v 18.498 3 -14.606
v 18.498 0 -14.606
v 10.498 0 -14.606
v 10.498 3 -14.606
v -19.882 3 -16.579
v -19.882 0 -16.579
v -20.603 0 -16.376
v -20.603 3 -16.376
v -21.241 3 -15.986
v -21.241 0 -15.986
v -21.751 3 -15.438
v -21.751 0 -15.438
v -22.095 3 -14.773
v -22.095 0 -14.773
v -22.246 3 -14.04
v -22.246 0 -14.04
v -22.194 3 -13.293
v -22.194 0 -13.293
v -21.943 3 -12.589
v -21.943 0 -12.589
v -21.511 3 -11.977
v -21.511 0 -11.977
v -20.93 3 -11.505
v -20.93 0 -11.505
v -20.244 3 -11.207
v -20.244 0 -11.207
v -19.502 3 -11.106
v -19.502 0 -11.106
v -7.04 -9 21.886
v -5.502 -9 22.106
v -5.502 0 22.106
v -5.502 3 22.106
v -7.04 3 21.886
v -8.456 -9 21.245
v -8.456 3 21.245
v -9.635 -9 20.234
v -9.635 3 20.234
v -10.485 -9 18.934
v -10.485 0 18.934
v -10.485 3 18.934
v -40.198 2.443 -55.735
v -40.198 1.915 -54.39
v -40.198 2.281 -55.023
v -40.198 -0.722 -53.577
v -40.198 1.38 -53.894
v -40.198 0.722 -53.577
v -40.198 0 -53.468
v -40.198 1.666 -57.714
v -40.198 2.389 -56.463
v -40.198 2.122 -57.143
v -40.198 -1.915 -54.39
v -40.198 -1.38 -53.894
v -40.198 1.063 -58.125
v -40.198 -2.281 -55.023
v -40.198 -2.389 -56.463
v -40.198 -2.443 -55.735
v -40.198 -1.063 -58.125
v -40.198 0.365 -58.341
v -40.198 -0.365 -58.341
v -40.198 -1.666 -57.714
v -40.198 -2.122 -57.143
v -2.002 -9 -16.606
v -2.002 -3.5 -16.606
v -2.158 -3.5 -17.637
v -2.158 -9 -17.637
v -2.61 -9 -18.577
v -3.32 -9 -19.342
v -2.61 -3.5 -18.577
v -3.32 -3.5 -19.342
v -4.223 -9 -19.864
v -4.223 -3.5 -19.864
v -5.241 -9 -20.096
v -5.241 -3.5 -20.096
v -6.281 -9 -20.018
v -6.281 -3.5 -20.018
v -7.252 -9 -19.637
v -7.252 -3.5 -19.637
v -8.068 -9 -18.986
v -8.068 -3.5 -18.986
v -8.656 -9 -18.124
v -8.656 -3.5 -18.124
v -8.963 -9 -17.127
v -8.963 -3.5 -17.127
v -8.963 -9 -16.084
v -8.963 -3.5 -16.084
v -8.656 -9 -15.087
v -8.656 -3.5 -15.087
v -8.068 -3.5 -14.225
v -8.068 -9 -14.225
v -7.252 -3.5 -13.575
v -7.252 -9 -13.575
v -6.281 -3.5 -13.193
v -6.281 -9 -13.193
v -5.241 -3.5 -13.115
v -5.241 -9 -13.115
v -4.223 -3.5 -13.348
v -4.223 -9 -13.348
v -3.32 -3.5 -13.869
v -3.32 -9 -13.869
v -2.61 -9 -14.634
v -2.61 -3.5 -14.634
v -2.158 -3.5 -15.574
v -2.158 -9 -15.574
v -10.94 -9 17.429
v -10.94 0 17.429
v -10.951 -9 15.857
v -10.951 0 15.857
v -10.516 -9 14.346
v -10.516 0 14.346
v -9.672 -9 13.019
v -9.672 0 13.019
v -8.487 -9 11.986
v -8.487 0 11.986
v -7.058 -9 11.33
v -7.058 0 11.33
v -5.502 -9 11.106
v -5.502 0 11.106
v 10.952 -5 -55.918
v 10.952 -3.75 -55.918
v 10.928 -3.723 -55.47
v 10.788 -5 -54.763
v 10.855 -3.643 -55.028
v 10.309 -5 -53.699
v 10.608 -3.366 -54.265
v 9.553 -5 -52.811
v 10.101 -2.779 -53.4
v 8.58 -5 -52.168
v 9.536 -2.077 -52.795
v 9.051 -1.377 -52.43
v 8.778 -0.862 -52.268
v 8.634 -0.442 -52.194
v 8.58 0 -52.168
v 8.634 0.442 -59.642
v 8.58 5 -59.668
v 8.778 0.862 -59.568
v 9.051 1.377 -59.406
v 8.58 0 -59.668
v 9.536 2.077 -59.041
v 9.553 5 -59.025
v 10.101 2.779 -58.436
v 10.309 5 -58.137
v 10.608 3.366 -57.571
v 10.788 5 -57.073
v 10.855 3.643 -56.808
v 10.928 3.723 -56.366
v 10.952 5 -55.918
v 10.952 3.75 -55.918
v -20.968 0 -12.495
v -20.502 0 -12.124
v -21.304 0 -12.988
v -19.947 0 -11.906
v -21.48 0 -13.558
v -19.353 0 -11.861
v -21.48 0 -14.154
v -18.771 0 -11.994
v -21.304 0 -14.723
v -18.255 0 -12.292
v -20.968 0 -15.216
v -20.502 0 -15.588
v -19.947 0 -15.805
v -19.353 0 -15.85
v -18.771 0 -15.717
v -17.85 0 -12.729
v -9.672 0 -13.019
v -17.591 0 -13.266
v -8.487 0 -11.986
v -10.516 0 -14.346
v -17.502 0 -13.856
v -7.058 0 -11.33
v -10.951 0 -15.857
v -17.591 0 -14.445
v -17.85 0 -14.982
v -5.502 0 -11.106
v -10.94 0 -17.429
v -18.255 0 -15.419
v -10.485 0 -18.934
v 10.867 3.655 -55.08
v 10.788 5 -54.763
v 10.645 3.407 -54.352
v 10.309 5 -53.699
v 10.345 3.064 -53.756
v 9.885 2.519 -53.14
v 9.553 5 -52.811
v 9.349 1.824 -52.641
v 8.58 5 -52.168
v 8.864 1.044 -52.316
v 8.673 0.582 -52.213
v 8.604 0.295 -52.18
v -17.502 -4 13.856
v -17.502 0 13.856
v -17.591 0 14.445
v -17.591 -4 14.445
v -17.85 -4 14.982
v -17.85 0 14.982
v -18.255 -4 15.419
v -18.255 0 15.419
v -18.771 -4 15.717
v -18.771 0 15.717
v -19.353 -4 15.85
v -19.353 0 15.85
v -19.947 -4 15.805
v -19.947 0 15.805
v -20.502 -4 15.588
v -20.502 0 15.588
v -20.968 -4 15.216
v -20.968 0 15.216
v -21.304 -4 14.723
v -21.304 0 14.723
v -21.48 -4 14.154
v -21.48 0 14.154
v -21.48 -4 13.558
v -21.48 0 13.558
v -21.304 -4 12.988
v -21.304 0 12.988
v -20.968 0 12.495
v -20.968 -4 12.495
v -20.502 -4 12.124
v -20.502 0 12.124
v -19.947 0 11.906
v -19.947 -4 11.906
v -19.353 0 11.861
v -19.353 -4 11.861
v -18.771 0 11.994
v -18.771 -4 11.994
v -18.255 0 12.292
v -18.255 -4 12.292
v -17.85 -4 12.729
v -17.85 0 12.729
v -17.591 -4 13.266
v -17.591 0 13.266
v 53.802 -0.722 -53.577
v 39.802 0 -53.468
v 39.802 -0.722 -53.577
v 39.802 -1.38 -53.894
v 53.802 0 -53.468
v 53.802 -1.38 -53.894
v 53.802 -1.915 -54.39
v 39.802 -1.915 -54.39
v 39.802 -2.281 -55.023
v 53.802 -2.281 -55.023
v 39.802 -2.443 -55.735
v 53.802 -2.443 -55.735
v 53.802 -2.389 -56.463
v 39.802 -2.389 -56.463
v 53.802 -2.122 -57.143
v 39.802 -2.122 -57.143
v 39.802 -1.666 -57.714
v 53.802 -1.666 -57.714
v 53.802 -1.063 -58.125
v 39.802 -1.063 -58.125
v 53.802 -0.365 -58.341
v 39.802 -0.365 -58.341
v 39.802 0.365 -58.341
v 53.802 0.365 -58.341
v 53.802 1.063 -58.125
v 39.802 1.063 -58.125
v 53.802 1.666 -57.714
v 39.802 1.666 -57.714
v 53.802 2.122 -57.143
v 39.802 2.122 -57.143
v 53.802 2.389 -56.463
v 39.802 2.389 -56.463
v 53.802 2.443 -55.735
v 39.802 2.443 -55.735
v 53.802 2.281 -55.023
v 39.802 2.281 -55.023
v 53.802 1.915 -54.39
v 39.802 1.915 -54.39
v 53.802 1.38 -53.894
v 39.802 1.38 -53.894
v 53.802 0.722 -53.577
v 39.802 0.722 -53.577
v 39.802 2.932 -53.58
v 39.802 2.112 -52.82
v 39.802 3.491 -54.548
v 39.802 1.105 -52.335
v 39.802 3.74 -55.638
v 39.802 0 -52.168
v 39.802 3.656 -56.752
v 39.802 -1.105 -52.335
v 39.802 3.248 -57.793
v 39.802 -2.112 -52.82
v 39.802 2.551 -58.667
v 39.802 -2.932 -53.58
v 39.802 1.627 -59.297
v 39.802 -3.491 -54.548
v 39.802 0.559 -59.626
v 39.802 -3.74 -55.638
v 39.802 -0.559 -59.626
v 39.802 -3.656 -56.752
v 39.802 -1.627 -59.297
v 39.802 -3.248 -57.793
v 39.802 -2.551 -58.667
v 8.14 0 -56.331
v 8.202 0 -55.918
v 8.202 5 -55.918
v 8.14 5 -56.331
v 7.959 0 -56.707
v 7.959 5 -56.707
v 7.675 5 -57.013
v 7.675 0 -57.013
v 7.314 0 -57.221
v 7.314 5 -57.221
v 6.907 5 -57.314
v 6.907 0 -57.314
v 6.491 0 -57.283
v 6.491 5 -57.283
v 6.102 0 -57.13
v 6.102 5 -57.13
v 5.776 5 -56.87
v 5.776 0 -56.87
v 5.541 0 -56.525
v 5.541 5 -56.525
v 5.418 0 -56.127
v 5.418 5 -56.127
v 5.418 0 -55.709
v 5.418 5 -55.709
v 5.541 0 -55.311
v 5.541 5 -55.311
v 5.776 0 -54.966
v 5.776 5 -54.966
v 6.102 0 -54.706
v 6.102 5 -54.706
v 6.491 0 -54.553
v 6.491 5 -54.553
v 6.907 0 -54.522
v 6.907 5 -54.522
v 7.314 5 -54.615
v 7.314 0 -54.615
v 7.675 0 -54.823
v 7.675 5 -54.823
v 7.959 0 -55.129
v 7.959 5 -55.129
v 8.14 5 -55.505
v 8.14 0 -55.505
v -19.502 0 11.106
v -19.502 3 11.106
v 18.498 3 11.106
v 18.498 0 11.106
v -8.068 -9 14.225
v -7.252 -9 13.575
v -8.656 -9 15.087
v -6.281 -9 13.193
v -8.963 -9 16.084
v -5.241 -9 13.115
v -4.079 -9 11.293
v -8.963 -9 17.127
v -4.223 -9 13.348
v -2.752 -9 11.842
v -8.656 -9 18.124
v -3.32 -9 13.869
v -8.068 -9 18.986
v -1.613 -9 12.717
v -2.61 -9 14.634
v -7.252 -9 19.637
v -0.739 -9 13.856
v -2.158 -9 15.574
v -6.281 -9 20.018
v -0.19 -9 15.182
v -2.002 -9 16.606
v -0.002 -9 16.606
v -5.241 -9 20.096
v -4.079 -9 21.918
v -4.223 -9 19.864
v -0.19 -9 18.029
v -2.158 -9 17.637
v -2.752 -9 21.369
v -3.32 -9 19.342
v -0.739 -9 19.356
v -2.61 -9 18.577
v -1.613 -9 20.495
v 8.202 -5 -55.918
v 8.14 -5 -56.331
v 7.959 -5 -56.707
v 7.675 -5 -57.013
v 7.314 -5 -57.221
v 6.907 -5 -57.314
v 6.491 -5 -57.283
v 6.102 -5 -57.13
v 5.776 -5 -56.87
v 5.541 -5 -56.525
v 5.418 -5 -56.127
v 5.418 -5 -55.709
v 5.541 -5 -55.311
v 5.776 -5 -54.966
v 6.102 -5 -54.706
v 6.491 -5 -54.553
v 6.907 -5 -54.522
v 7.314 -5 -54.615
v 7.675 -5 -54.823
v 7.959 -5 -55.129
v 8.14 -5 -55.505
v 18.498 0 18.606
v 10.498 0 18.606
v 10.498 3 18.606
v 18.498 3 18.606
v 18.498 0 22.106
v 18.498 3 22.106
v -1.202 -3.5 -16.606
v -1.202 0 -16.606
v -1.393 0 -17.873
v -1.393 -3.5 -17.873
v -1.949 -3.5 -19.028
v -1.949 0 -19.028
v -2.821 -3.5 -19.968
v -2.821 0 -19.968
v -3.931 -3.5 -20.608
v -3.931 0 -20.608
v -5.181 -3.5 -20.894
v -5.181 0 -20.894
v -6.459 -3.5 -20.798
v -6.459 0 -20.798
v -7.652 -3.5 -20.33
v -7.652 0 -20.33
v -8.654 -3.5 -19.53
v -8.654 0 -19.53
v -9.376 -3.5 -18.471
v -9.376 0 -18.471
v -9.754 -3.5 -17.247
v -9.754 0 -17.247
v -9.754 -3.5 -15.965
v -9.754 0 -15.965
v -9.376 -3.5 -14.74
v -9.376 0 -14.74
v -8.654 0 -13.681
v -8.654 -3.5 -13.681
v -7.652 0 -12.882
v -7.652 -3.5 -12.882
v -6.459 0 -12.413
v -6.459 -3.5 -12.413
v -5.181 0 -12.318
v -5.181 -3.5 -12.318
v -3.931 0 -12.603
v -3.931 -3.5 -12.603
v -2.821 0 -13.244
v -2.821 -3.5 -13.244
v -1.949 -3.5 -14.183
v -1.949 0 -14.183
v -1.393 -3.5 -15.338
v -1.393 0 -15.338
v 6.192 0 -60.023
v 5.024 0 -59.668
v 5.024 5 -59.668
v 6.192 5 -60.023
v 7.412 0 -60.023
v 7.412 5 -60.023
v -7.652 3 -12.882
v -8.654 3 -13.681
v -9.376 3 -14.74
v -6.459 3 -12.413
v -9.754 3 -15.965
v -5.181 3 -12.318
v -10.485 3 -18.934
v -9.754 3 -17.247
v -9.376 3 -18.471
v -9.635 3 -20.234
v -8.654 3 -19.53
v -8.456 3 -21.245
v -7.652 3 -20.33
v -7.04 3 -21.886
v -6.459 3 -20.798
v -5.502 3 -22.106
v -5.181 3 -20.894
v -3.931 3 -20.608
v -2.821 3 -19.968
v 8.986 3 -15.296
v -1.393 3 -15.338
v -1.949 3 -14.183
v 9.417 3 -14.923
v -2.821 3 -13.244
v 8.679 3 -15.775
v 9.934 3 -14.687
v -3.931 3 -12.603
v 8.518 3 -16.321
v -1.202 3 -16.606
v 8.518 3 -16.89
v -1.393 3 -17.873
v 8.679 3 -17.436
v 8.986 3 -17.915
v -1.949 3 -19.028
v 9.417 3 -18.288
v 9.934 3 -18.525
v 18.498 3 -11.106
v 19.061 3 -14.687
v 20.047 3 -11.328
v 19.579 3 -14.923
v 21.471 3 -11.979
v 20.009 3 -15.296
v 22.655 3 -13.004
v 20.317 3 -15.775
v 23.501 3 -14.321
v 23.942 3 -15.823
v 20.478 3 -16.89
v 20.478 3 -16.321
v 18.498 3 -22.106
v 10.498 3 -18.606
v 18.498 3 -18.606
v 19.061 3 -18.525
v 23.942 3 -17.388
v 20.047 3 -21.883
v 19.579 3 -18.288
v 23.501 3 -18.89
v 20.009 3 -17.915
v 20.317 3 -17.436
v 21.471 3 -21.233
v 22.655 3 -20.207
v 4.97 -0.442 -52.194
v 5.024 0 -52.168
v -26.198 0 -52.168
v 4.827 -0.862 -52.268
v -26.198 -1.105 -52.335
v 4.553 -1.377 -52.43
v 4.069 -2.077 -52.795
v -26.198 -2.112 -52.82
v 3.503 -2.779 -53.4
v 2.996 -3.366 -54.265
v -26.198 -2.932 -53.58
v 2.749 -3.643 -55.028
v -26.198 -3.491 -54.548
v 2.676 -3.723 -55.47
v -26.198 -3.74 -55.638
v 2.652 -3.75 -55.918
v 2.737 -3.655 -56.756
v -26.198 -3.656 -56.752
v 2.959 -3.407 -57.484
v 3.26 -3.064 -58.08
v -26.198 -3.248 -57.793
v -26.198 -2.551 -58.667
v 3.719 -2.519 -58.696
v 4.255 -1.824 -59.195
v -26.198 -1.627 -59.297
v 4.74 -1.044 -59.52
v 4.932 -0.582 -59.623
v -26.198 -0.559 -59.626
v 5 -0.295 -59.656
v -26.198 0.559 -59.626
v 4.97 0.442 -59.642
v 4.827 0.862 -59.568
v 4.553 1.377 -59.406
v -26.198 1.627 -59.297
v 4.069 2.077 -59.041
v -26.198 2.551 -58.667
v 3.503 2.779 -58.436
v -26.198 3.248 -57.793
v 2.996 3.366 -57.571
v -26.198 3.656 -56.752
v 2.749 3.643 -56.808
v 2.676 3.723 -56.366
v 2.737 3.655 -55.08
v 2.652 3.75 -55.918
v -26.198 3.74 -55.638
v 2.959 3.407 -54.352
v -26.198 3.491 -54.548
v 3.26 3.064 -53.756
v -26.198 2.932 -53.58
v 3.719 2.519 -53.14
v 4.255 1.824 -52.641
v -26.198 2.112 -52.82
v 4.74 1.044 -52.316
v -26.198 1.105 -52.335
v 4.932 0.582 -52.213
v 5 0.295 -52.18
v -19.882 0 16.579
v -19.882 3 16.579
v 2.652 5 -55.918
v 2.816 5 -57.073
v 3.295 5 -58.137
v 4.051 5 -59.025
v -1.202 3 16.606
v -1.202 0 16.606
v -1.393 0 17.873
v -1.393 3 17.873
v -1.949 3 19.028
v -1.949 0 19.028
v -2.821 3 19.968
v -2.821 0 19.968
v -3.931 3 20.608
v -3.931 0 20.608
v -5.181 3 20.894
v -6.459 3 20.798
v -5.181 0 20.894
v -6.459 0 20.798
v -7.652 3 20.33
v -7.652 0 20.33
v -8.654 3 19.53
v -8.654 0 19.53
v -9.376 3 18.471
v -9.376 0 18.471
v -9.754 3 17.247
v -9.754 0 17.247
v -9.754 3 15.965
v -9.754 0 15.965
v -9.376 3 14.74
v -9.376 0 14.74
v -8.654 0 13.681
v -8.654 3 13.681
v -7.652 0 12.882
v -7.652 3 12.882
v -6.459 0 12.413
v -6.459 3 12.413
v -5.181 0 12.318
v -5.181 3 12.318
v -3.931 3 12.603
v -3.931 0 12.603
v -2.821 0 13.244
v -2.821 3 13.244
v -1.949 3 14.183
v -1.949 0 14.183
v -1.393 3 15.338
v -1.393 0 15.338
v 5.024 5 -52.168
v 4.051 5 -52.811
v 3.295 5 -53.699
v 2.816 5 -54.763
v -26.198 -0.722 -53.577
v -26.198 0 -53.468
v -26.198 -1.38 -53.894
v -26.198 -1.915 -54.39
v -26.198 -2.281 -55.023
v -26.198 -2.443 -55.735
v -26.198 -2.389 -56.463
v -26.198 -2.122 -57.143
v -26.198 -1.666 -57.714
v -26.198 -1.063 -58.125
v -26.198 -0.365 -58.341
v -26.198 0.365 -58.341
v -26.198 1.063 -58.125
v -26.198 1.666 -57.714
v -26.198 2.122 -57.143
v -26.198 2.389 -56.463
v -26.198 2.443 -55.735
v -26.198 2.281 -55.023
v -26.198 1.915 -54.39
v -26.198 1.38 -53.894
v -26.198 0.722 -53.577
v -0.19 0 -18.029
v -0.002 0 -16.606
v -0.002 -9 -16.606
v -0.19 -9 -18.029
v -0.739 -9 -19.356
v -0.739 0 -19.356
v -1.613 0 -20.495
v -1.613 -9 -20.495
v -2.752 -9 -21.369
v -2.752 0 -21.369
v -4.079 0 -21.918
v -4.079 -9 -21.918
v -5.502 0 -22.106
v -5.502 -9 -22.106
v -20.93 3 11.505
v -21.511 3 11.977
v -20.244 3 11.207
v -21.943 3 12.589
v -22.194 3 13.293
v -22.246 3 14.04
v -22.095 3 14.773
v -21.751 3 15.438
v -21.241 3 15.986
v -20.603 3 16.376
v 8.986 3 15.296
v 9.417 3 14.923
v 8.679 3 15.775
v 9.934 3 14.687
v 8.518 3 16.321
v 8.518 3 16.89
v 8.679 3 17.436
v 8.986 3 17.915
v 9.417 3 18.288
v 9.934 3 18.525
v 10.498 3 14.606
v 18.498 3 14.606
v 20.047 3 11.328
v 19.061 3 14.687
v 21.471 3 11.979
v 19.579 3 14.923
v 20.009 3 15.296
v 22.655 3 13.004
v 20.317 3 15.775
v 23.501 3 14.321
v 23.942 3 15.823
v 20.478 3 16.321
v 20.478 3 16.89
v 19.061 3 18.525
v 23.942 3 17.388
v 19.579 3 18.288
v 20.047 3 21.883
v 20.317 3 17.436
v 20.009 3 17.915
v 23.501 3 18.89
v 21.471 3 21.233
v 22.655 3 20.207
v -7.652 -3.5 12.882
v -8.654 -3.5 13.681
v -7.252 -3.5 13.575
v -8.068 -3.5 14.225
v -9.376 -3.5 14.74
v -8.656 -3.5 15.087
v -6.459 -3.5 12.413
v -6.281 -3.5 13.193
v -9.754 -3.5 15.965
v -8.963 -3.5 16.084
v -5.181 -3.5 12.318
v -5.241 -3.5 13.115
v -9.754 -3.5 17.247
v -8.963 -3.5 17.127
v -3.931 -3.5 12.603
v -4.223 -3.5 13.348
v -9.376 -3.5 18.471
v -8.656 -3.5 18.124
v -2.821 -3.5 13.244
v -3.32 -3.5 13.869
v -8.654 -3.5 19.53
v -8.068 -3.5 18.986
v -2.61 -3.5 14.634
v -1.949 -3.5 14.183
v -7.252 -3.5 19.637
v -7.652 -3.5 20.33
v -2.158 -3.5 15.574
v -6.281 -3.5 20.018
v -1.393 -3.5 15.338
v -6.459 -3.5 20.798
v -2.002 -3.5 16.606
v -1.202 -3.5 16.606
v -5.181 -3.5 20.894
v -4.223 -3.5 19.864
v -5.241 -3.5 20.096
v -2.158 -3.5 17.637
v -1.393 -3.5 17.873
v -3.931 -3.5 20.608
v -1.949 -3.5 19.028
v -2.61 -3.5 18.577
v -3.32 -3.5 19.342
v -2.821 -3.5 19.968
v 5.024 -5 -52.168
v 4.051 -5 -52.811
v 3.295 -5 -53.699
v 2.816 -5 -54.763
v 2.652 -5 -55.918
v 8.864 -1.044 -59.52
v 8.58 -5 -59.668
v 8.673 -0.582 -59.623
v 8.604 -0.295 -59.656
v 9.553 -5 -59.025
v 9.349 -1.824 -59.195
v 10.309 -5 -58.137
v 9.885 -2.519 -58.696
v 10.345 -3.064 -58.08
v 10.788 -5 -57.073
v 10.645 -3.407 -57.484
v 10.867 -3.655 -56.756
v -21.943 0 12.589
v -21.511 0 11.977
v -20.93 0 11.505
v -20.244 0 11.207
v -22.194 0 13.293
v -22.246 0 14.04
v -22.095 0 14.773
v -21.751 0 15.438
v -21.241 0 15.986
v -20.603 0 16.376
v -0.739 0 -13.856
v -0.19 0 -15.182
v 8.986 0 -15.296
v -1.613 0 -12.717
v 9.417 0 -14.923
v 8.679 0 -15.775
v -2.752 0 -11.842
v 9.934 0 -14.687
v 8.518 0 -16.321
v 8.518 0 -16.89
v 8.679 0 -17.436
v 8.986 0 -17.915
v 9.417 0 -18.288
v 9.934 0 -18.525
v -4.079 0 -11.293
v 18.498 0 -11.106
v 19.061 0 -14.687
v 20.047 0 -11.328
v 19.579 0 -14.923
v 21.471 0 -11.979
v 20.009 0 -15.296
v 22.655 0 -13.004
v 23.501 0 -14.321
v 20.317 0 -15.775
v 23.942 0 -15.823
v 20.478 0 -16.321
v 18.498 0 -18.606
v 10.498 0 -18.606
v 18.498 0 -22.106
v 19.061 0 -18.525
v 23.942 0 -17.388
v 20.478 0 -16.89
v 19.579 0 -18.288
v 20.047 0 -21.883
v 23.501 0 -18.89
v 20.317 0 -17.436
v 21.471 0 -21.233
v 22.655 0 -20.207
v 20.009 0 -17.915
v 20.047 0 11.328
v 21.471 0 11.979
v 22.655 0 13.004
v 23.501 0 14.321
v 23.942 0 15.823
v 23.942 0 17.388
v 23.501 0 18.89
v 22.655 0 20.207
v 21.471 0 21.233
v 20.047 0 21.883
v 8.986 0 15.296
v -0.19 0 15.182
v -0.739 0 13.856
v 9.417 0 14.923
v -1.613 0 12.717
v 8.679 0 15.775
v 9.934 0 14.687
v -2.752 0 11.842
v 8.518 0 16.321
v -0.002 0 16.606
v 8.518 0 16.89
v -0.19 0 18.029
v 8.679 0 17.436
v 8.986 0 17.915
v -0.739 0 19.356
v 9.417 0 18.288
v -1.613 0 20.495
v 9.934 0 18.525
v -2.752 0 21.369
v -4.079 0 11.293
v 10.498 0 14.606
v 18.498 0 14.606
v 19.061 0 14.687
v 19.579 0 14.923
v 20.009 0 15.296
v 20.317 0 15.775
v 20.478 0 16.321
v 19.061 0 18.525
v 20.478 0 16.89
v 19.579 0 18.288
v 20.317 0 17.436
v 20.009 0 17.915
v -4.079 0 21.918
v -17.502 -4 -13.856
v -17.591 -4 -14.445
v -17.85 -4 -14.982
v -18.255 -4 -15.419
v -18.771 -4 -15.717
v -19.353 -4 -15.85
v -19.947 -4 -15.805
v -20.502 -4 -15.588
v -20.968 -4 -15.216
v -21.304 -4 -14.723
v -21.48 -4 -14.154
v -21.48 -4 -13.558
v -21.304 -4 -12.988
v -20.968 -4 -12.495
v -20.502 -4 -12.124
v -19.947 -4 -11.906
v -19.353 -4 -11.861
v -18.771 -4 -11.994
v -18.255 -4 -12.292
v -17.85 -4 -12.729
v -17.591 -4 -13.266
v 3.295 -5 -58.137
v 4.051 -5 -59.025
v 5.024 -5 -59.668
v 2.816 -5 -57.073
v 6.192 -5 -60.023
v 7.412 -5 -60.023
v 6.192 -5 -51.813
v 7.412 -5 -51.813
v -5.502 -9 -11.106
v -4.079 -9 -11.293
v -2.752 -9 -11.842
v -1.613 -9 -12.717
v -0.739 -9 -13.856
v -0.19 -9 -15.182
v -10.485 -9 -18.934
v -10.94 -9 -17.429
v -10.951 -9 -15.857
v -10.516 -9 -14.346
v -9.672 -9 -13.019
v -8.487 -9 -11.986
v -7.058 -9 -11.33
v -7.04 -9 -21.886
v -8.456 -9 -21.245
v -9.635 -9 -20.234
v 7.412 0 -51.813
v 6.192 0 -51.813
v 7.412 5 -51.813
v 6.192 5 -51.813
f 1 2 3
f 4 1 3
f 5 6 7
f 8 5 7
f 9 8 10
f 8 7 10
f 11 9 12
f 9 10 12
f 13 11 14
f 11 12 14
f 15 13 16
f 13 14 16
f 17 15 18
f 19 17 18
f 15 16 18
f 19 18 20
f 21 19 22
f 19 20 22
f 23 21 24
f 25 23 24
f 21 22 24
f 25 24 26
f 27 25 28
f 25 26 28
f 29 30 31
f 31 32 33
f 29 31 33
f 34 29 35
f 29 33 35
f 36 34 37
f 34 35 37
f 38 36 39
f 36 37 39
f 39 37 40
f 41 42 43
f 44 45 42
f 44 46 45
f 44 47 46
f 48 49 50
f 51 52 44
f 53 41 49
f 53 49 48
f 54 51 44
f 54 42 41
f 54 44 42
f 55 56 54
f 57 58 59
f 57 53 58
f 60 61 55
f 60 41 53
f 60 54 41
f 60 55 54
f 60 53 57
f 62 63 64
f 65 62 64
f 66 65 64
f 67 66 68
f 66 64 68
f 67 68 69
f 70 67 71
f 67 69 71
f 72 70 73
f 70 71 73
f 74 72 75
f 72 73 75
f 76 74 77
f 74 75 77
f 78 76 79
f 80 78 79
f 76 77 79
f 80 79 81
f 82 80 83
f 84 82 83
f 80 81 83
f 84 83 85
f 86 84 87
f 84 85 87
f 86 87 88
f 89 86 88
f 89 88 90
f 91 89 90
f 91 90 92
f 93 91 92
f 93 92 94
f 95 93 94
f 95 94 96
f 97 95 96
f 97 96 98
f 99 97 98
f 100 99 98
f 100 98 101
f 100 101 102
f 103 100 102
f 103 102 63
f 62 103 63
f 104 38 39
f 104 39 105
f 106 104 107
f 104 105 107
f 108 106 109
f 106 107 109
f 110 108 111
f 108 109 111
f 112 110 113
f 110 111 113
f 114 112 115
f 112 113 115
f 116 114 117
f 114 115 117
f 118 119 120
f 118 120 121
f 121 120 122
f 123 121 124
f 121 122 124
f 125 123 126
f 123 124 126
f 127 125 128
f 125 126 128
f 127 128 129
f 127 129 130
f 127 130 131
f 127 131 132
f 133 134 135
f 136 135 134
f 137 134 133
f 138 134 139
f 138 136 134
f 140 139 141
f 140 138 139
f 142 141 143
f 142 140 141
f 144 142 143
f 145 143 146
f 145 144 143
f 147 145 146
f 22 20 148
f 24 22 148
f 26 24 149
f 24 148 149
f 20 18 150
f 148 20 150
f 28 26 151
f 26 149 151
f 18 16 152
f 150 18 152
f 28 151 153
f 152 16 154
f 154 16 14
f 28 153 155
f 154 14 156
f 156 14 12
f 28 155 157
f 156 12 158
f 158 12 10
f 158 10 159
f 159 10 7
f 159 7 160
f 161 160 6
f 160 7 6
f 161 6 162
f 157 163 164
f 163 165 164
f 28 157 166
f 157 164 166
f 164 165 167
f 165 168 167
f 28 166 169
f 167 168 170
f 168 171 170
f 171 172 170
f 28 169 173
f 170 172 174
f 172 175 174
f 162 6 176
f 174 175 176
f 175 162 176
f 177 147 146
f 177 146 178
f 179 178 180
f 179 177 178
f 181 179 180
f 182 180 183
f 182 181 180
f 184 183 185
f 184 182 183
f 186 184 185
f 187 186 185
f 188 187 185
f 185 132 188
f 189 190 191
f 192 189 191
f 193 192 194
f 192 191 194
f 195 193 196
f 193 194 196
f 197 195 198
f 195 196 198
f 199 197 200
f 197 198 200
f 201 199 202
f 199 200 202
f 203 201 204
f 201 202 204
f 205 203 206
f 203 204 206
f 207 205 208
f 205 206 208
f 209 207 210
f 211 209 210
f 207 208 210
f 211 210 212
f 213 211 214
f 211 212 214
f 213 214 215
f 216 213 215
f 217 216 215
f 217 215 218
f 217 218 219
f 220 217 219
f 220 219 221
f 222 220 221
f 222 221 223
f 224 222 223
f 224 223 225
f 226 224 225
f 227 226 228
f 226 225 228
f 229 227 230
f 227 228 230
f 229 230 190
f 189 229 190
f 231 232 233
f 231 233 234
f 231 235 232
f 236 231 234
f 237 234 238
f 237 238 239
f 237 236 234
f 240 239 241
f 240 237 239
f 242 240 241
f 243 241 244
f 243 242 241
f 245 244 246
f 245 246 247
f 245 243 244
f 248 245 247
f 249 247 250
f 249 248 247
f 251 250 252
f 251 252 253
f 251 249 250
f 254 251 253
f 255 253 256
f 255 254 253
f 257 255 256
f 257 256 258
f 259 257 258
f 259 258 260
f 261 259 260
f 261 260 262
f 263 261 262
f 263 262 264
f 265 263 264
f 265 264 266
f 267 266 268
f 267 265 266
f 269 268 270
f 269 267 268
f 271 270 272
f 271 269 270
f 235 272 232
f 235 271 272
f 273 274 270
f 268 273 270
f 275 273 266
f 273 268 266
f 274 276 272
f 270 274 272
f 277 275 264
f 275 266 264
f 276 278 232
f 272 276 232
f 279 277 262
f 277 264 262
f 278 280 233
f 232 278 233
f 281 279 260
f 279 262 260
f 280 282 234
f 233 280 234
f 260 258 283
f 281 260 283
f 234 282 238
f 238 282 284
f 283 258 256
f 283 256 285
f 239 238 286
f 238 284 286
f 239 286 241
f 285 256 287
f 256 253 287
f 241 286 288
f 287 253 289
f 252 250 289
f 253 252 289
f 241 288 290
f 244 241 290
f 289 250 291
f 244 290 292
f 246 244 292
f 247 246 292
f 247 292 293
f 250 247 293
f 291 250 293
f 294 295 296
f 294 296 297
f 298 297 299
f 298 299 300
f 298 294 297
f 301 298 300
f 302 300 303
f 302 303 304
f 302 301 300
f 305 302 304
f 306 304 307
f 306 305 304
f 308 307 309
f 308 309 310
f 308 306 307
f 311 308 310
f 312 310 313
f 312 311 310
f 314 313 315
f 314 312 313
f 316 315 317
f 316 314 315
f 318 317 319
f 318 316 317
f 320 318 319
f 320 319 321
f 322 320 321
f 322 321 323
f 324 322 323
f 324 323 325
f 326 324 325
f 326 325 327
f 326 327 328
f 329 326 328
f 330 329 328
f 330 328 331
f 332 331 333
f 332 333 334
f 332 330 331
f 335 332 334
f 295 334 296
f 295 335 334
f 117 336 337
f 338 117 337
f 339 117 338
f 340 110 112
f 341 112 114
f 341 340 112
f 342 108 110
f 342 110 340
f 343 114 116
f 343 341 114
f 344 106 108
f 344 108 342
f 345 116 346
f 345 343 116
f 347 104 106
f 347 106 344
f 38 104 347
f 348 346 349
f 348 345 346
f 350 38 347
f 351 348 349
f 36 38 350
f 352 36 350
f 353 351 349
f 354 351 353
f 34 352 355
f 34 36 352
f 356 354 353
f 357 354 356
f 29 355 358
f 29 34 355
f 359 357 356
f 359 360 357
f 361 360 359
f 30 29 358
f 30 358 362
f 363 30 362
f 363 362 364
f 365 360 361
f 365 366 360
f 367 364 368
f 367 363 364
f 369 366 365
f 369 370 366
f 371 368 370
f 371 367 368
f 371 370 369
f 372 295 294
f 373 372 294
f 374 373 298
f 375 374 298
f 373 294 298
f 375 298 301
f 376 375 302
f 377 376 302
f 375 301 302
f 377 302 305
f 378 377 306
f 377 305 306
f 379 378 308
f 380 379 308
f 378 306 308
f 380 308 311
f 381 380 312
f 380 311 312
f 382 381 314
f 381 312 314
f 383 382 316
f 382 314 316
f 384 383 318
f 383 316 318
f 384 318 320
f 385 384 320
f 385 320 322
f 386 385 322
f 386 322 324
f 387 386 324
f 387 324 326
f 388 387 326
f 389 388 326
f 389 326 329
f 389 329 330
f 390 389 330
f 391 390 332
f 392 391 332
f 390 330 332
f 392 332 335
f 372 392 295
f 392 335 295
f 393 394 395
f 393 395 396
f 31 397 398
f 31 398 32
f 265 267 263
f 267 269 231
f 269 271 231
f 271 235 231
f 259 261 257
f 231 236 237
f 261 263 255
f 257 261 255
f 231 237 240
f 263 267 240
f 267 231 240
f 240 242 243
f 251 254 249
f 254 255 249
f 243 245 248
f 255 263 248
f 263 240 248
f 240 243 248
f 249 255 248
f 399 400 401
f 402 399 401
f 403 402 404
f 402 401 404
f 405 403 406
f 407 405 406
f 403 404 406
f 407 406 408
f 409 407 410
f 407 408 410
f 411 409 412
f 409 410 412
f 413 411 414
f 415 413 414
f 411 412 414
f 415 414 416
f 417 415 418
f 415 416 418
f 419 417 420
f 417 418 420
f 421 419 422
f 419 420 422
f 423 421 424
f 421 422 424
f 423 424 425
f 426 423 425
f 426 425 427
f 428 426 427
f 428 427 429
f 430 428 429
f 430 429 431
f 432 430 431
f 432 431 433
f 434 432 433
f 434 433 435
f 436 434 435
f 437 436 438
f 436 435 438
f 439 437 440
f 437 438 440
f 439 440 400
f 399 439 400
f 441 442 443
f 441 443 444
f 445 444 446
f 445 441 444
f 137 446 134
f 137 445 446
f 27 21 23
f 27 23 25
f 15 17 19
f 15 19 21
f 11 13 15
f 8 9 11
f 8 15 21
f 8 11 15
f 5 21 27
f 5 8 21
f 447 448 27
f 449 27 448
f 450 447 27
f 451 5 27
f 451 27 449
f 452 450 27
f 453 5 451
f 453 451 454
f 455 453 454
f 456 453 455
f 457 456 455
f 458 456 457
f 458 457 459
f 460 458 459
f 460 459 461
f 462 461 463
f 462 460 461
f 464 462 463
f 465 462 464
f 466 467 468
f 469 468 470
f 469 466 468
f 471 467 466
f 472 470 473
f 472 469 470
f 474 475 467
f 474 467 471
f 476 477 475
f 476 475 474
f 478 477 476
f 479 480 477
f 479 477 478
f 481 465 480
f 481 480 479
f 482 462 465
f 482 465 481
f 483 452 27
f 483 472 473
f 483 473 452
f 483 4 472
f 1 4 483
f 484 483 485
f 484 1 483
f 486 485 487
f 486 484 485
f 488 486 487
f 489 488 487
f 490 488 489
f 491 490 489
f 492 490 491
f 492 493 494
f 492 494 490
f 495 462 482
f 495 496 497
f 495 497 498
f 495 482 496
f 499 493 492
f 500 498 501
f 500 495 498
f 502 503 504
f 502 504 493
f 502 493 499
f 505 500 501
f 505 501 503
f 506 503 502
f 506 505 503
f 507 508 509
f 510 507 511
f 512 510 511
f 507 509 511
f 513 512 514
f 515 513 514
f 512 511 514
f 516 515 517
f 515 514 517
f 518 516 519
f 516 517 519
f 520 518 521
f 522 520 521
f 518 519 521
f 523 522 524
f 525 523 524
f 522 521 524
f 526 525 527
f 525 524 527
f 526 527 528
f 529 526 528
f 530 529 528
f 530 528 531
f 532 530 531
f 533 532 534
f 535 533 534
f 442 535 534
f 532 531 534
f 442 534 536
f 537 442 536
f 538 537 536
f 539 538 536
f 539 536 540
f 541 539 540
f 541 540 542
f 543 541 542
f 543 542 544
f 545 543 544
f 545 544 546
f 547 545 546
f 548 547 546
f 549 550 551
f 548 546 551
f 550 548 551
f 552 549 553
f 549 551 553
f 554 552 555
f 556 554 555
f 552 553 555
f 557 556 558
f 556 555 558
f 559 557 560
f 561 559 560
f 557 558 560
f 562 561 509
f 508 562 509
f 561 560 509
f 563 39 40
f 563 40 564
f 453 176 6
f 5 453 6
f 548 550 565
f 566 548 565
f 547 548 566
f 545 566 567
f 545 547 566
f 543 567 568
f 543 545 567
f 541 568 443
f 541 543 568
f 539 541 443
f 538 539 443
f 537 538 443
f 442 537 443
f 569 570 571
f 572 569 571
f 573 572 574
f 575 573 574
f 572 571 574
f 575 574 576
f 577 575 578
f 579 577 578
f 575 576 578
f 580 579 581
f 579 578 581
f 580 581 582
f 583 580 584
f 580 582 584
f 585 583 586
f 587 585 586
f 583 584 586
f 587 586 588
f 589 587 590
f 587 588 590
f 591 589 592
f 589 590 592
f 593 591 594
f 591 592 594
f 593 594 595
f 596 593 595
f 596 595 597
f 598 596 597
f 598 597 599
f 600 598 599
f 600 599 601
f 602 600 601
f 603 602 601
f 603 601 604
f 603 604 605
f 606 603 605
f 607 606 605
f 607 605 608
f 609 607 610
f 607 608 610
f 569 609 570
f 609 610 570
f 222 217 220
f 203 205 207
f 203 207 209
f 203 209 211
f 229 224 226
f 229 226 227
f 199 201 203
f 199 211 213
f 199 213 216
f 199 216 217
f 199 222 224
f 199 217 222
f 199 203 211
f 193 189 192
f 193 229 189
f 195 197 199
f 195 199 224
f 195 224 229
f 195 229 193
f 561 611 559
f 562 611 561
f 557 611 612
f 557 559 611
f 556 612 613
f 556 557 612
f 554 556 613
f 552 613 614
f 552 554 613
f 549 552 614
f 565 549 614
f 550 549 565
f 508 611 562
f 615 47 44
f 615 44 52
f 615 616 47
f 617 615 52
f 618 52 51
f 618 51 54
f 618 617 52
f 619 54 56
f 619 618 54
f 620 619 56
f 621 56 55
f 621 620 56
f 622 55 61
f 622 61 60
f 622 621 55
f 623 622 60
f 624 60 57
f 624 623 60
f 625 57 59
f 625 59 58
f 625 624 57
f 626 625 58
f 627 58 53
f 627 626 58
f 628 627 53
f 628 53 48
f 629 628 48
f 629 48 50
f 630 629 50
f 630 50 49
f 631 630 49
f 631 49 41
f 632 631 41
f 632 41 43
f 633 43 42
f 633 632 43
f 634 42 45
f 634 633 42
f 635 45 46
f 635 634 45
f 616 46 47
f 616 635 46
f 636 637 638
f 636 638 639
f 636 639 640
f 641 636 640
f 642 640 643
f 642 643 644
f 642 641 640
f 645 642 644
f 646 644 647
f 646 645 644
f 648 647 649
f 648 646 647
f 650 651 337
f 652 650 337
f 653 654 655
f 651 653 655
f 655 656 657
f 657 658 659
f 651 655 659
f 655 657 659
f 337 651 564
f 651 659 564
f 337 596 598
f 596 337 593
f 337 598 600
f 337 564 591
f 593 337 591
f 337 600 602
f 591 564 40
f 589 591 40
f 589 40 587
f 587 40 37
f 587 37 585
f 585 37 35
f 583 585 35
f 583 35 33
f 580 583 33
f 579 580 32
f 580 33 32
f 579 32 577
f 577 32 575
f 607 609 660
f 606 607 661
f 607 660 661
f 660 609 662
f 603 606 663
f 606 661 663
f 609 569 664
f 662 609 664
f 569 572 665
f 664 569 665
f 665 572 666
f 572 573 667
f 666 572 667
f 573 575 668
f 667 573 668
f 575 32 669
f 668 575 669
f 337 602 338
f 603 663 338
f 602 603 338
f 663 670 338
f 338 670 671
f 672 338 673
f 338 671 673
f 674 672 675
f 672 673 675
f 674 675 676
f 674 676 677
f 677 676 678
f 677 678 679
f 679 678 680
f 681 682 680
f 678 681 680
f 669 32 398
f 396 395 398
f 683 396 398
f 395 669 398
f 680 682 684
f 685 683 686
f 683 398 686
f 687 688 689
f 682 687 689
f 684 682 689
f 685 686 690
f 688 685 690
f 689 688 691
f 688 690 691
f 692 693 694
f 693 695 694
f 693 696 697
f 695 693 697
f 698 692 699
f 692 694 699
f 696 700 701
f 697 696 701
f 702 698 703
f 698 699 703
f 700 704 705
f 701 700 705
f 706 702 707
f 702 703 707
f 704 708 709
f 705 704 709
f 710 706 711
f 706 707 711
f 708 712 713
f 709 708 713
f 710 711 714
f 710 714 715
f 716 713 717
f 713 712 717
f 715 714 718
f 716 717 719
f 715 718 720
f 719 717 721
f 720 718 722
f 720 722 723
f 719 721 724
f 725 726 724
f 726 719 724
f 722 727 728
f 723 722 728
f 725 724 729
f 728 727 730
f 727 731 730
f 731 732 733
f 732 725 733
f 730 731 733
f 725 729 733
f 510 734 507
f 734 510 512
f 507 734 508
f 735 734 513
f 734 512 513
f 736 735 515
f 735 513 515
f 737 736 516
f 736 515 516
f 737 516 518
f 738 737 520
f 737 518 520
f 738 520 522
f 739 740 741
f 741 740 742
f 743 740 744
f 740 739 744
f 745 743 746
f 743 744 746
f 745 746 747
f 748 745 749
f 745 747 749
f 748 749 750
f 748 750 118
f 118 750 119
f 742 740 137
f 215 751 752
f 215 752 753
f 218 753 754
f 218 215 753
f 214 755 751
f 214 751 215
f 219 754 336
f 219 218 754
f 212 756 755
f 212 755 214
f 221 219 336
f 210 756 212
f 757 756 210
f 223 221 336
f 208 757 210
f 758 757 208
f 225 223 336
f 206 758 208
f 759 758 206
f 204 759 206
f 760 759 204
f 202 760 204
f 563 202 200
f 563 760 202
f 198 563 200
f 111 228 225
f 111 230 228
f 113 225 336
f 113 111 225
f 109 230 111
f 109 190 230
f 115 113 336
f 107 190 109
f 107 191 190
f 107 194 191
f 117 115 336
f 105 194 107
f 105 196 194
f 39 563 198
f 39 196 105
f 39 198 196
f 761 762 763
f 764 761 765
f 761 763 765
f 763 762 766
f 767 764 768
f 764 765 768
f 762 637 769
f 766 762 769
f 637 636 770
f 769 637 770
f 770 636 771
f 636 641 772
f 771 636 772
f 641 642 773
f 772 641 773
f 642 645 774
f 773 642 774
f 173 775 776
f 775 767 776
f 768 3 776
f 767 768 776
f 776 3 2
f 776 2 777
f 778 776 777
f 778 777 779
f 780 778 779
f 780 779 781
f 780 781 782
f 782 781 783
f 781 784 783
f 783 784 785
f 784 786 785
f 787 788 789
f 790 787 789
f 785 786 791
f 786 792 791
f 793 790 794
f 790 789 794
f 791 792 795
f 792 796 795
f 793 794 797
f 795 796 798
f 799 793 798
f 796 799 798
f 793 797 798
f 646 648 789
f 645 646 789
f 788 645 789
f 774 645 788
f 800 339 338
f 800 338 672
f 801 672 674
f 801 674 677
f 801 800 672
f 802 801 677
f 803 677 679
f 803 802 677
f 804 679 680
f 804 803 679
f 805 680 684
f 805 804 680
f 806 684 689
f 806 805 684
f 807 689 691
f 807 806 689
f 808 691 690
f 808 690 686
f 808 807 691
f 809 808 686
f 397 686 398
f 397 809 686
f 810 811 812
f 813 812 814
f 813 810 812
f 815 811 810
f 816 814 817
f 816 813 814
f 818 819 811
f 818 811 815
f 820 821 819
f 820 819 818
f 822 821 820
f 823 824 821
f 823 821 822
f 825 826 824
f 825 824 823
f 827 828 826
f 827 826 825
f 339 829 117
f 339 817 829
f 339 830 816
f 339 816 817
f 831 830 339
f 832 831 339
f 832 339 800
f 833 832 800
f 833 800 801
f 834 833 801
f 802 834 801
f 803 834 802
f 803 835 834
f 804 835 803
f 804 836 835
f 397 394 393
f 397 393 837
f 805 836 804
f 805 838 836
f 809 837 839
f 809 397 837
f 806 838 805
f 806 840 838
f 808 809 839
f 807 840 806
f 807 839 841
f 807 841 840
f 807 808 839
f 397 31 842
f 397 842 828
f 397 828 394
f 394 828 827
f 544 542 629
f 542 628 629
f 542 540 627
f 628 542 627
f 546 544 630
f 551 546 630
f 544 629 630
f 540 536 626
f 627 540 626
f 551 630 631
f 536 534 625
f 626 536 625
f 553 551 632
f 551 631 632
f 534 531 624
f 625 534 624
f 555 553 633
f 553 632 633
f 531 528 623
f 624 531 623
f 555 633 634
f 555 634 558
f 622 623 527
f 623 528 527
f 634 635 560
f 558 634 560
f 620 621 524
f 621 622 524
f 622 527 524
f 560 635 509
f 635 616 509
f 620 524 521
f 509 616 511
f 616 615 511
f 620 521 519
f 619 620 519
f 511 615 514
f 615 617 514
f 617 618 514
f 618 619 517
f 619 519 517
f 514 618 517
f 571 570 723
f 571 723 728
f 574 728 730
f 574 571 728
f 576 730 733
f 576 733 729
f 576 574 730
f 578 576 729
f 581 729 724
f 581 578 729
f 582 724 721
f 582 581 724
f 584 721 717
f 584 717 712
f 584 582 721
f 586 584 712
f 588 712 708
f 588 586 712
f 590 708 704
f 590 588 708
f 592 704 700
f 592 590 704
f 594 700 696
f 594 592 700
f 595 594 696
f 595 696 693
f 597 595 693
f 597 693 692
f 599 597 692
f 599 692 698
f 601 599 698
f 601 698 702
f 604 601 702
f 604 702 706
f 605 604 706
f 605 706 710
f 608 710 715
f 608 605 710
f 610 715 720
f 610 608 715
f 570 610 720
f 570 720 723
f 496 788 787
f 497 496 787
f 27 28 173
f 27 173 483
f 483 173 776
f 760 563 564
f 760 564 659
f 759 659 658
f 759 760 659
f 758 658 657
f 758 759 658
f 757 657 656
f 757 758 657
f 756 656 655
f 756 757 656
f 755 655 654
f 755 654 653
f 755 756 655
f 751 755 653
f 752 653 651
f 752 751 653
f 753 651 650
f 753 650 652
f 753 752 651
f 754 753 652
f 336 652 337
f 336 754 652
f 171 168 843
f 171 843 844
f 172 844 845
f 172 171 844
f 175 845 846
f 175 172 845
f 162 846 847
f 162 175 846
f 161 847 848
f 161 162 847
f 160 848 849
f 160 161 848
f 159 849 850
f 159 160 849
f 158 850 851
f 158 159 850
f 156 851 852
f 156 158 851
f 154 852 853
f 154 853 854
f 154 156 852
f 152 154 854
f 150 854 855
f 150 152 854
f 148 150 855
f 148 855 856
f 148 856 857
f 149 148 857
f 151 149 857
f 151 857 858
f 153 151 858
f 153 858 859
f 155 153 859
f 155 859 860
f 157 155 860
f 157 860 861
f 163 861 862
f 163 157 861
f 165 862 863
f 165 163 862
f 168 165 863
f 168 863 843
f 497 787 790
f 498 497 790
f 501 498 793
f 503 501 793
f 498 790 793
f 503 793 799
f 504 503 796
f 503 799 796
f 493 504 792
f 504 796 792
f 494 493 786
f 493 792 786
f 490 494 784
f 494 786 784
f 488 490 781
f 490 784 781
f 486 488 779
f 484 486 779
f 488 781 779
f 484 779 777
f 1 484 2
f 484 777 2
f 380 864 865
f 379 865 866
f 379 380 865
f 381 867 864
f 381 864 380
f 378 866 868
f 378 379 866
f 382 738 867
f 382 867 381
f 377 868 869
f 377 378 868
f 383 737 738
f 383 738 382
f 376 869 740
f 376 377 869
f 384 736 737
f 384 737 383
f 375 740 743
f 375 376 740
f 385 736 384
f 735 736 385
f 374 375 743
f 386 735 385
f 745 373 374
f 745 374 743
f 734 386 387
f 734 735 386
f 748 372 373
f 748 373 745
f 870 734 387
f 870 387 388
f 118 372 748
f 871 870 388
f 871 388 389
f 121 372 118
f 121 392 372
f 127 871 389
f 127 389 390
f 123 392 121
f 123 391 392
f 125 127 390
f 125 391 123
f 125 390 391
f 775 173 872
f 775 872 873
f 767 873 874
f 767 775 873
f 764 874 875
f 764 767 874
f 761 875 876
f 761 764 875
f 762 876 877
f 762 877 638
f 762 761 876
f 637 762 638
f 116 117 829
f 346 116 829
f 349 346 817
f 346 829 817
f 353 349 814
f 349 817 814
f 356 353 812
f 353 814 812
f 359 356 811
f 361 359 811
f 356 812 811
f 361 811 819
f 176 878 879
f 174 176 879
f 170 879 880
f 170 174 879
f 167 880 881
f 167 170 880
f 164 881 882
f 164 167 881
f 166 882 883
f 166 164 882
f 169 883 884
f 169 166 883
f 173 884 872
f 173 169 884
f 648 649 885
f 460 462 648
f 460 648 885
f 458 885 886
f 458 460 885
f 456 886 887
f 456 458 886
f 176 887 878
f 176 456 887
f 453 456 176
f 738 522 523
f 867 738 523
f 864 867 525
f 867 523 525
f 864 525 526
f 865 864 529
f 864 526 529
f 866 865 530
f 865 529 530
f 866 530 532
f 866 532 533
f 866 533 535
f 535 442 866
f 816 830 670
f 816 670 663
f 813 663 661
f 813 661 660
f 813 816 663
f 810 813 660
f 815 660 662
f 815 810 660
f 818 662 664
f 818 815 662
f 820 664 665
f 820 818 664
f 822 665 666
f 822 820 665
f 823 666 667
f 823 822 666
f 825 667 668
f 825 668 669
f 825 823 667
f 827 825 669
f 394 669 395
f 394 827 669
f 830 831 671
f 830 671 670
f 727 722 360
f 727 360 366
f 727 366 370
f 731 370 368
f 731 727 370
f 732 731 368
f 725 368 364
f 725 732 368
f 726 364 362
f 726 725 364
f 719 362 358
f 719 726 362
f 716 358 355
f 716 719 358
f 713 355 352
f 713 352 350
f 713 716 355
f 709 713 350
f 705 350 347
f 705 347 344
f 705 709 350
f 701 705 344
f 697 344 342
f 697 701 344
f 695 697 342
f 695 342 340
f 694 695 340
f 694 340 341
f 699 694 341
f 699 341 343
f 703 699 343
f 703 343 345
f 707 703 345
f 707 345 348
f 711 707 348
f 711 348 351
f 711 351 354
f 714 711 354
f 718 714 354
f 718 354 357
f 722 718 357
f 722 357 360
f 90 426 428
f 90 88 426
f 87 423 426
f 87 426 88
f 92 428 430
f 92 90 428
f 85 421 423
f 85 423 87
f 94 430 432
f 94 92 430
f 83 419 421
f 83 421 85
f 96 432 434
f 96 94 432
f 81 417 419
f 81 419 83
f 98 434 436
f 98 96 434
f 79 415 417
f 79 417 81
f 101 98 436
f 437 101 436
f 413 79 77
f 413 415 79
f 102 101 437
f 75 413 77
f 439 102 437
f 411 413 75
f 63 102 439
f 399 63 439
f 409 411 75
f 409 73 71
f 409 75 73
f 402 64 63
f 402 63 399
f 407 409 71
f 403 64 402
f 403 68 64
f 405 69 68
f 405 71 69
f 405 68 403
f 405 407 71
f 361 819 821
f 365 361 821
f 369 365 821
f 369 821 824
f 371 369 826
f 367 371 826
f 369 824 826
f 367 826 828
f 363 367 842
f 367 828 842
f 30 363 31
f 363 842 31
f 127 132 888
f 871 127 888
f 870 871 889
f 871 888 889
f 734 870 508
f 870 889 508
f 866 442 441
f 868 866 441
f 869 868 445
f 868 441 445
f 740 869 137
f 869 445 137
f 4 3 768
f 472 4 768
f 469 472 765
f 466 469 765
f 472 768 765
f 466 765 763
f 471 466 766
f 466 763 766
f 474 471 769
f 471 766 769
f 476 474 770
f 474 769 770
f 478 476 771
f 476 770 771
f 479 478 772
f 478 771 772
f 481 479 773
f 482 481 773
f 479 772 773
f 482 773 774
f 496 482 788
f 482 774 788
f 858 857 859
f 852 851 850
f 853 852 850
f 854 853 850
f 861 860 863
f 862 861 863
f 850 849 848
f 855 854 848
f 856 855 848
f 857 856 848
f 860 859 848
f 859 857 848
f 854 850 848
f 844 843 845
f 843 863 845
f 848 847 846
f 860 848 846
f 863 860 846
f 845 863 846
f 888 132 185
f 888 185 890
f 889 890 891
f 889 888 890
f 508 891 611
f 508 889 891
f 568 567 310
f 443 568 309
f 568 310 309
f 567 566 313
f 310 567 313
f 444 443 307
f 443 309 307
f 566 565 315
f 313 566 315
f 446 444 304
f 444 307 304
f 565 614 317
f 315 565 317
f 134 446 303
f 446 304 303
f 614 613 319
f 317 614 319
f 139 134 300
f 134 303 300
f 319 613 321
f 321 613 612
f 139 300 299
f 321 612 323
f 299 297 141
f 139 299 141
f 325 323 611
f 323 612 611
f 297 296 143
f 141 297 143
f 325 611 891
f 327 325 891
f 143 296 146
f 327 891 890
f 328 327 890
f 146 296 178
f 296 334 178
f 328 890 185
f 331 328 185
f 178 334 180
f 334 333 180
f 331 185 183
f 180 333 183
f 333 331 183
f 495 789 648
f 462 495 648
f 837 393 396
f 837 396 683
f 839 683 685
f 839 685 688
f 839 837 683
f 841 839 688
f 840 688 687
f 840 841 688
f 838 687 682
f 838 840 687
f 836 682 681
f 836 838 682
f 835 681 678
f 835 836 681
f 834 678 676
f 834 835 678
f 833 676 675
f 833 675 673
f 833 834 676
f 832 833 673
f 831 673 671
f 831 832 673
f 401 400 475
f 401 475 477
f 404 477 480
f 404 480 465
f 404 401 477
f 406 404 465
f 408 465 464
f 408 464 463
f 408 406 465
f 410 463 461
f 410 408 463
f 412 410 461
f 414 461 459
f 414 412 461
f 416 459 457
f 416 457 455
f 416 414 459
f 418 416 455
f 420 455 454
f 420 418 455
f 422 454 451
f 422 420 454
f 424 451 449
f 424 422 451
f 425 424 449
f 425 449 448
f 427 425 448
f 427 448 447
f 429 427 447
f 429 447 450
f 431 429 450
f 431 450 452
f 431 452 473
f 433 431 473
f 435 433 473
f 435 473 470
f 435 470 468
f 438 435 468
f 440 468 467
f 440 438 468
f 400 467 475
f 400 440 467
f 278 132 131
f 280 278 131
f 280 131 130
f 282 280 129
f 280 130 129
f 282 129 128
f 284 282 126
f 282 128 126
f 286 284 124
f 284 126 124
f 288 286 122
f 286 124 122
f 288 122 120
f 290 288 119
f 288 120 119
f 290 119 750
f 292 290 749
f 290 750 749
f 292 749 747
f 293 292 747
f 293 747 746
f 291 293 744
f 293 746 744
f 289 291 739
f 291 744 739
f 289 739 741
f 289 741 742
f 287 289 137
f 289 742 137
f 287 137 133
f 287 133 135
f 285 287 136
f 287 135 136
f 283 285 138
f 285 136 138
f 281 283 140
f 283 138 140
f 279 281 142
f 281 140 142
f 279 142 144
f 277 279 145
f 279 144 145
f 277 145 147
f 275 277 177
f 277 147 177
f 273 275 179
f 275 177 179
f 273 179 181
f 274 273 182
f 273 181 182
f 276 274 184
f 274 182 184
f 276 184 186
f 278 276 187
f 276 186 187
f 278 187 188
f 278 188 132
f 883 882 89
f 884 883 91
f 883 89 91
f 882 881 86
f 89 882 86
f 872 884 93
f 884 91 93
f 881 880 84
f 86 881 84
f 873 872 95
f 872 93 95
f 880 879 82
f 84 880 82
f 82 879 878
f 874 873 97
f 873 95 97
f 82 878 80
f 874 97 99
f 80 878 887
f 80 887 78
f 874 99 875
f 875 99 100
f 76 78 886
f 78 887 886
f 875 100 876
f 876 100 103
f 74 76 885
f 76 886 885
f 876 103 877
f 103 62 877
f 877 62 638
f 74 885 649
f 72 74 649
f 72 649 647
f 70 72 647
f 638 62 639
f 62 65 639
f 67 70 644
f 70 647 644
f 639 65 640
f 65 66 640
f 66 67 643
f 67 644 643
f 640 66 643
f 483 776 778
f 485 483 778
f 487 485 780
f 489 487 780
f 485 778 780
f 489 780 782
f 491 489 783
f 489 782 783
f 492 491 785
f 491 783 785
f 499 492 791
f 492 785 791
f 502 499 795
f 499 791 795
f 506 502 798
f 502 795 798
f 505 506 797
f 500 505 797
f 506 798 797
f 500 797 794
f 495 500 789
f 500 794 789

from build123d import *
from build123d import SkipClean  # not in build123d's __all__

# Parameters (mm, degrees)
F0_R     = 4.3
F0_R_2   = 2
F1_DEPTH = 3
F2_DEPTH = 4
F0_R_3   = 3.5
F3_DEPTH = 9
F4_DEPTH = 3.5
F7_DEPTH = 5
F8_DEPTH = 5
F6_W     = 14
F6_H     = 2.45


# Not quite as in the source:
# - after a boolean that leaves OpenCascade's solid faulty, fix() repairs it


with BuildPart() as f1:
    # F0 (on Front) → F1 (new body)
    with BuildSketch(Plane.XZ):
        with BuildLine():
            ThreePointArc((-5.5021138936, 11.1056324095), (-10.1418826672, 13.6522367828), (-10.4850494589, 18.9337975995))
            Line((-10.4850494589, 18.9337975995), (-19.8824234241, 16.5792081218))
            ThreePointArc((-19.8824234241, 16.5792081218), (-17.6970309604, 15.9302831281), (-16.7521138936, 13.8556324095))
            ThreePointArc((-16.7521138936, 13.8556324095), (-17.5575702454, 11.9110887612), (-19.5021138936, 11.1056324095))
            Line((-19.5021138936, 11.1056324095), (-5.5021138936, 11.1056324095))
        make_face()
        with BuildLine():
            ThreePointArc((-0.0021138936, 16.6056324095), (-1.6130265971, 20.494719706), (-5.5021138936, 22.1056324095))
            ThreePointArc((-5.5021138936, 22.1056324095), (-8.4555095203, 21.2454011831), (-10.4850494589, 18.9337975995))
            ThreePointArc((-10.4850494589, 18.9337975995), (-10.1418826672, 13.6522367828), (-5.5021138936, 11.1056324095))
            ThreePointArc((-5.5021138936, 11.1056324095), (-1.6130265971, 12.7165451129), (-0.0021138936, 16.6056324095))
        make_face()
        with Locations((-5.5021138936, 16.6056324095)):
            Circle(F0_R, mode=Mode.SUBTRACT)
        with BuildLine():
            Line((18.4978861064, 22.1056324095), (-5.5021138936, 22.1056324095))
            ThreePointArc((-5.5021138936, 22.1056324095), (-1.6130265971, 20.494719706), (-0.0021138936, 16.6056324095))
            ThreePointArc((-0.0021138936, 16.6056324095), (-1.6130265971, 12.7165451129), (-5.5021138936, 11.1056324095))
            Line((-5.5021138936, 11.1056324095), (18.4978861064, 11.1056324095))
            ThreePointArc((18.4978861064, 11.1056324095), (23.9978861064, 16.6056324095), (18.4978861064, 22.1056324095))
        make_face()
        with BuildLine():
            ThreePointArc((18.4978861064, 18.6056324095), (20.4978861064, 16.6056324095), (18.4978861064, 14.6056324095))
            Line((18.4978861064, 14.6056324095), (10.4978861064, 14.6056324095))
            ThreePointArc((10.4978861064, 14.6056324095), (8.4978861064, 16.6056324095), (10.4978861064, 18.6056324095))
            Line((10.4978861064, 18.6056324095), (18.4978861064, 18.6056324095))
        make_face(mode=Mode.SUBTRACT)
        with BuildLine():
            ThreePointArc((-16.7521138936, 13.8556324095), (-17.6970309604, 15.9302831281), (-19.8824234241, 16.5792081218))
            ThreePointArc((-19.8824234241, 16.5792081218), (-22.245499868, 13.6650192004), (-19.5021138936, 11.1056324095))
            ThreePointArc((-19.5021138936, 11.1056324095), (-17.5575702454, 11.9110887612), (-16.7521138936, 13.8556324095))
        make_face()
        with Locations((-19.5021138936, 13.8556324095)):
            Circle(F0_R_2, mode=Mode.SUBTRACT)
        with Locations((-19.5021138936, 13.8556324095)):
            Circle(F0_R_2)
    extrude(amount=-F1_DEPTH)

    # F0 (on Front) → F2 (join)
    with BuildSketch(Plane.XZ):
        with Locations((-19.5021138936, 13.8556324095)):
            Circle(F0_R_2)
    extrude(amount=F2_DEPTH)

    # F0 (on Front) → F3 (join)
    with BuildSketch(Plane.XZ):
        with BuildLine():
            ThreePointArc((-0.0021138936, 16.6056324095), (-1.6130265971, 20.494719706), (-5.5021138936, 22.1056324095))
            ThreePointArc((-5.5021138936, 22.1056324095), (-8.4555095203, 21.2454011831), (-10.4850494589, 18.9337975995))
            ThreePointArc((-10.4850494589, 18.9337975995), (-10.1418826672, 13.6522367828), (-5.5021138936, 11.1056324095))
            ThreePointArc((-5.5021138936, 11.1056324095), (-1.6130265971, 12.7165451129), (-0.0021138936, 16.6056324095))
        make_face()
        with Locations((-5.5021138936, 16.6056324095)):
            Circle(F0_R, mode=Mode.SUBTRACT)
        with Locations((-5.5021138936, 16.6056324095)):
            Circle(F0_R)
        with Locations((-5.5021138936, 16.6056324095)):
            Circle(F0_R_3, mode=Mode.SUBTRACT)
    with SkipClean():  # cleaning this boolean's faces spoils the solid; the shape is the same uncleaned
        extrude(amount=F3_DEPTH)

    # F4 (cut): a face of the model
    f4_faces = [f1.faces().sort_by_distance(p)[0] for p in [
        (-9.6804915273, 0, 16.6056324095),
    ]]
    extrude(f4_faces, amount=-F4_DEPTH, mode=Mode.SUBTRACT)

    add(f1.part.fix(), mode=Mode.REPLACE)


with BuildPart() as f5_1:
    # F5: instance of F1
    add(f1.part.mirror(Plane.XY), clean=False)


with BuildPart() as f7:
    # F6 (on Front) → F7 (new body)
    with BuildSketch(Plane.XZ):
        with BuildLine():
            Line((8.2020538688, -55.9179931879), (10.9520538688, -55.9179931879))
            ThreePointArc((10.9520538688, -55.9179931879), (10.3091681645, -53.6992887649), (8.5796927522, -52.1679931879))
            ThreePointArc((8.5796927522, -52.1679931879), (6.8020538688, -51.7679931879), (5.0244149853, -52.1679931879))
            ThreePointArc((5.0244149853, -52.1679931879), (3.2949395731, -53.6992887649), (2.6520538688, -55.9179931879))
            Line((2.6520538688, -55.9179931879), (5.4020538688, -55.9179931879))
            ThreePointArc((5.4020538688, -55.9179931879), (6.8020538688, -54.5179931879), (8.2020538688, -55.9179931879))
        make_face()
        with BuildLine():
            ThreePointArc((8.5796927522, -59.6679931879), (10.3091681645, -58.1366976109), (10.9520538688, -55.9179931879))
            Line((10.9520538688, -55.9179931879), (8.2020538688, -55.9179931879))
            ThreePointArc((8.2020538688, -55.9179931879), (6.8020538688, -57.3179931879), (5.4020538688, -55.9179931879))
            Line((5.4020538688, -55.9179931879), (2.6520538688, -55.9179931879))
            ThreePointArc((2.6520538688, -55.9179931879), (3.2949395731, -58.1366976109), (5.0244149853, -59.6679931879))
            ThreePointArc((5.0244149853, -59.6679931879), (6.8020538688, -60.0679931879), (8.5796927522, -59.6679931879))
        make_face()
    extrude(amount=F7_DEPTH)

    # F6 (on Front) → F8 (join)
    with BuildSketch(Plane.XZ):
        with BuildLine():
            Line((8.2020538688, -55.9179931879), (10.9520538688, -55.9179931879))
            ThreePointArc((10.9520538688, -55.9179931879), (10.3091681645, -53.6992887649), (8.5796927522, -52.1679931879))
            ThreePointArc((8.5796927522, -52.1679931879), (6.8020538688, -51.7679931879), (5.0244149853, -52.1679931879))
            ThreePointArc((5.0244149853, -52.1679931879), (3.2949395731, -53.6992887649), (2.6520538688, -55.9179931879))
            Line((2.6520538688, -55.9179931879), (5.4020538688, -55.9179931879))
            ThreePointArc((5.4020538688, -55.9179931879), (6.8020538688, -54.5179931879), (8.2020538688, -55.9179931879))
        make_face()
        with BuildLine():
            ThreePointArc((8.5796927522, -59.6679931879), (10.3091681645, -58.1366976109), (10.9520538688, -55.9179931879))
            Line((10.9520538688, -55.9179931879), (8.2020538688, -55.9179931879))
            ThreePointArc((8.2020538688, -55.9179931879), (6.8020538688, -57.3179931879), (5.4020538688, -55.9179931879))
            Line((5.4020538688, -55.9179931879), (2.6520538688, -55.9179931879))
            ThreePointArc((2.6520538688, -55.9179931879), (3.2949395731, -58.1366976109), (5.0244149853, -59.6679931879))
            ThreePointArc((5.0244149853, -59.6679931879), (6.8020538688, -60.0679931879), (8.5796927522, -59.6679931879))
        make_face()
    extrude(amount=-F8_DEPTH)

    # F6 (on Front) → F9 (revolve)
    with BuildSketch(Plane.XZ):
        with BuildLine():
            ThreePointArc((2.6520538688, -55.9179931879), (3.2949395731, -53.6992887649), (5.0244149853, -52.1679931879))
            Line((5.0244149853, -52.1679931879), (-26.1979461312, -52.1679931879))
            Line((-26.1979461312, -52.1679931879), (-26.1979461312, -53.4679931879))
            Line((-26.1979461312, -53.4679931879), (-26.1979461312, -55.9179931879))
            Line((-26.1979461312, -55.9179931879), (2.6520538688, -55.9179931879))
        make_face()
        with Locations((-33.1979461312, -54.6929931879)):
            Rectangle(F6_W, F6_H)
        with BuildLine():
            ThreePointArc((8.5796927522, -52.1679931879), (10.3091681645, -53.6992887649), (10.9520538688, -55.9179931879))
            Line((10.9520538688, -55.9179931879), (39.8020538688, -55.9179931879))
            Line((39.8020538688, -55.9179931879), (39.8020538688, -53.4679931879))
            Line((39.8020538688, -53.4679931879), (39.8020538688, -52.1679931879))
            Line((39.8020538688, -52.1679931879), (8.5796927522, -52.1679931879))
        make_face()
        with Locations((46.8020538688, -54.6929931879)):
            Rectangle(F6_W, F6_H)
    with SkipClean():  # cleaning this boolean's faces spoils the solid; the shape is the same uncleaned
        revolve(axis=Axis((6.8020538688, 0, -55.9179931879), (1, 0, 0)))


solid = Compound([f1.part, f5_1.part, f7.part])
